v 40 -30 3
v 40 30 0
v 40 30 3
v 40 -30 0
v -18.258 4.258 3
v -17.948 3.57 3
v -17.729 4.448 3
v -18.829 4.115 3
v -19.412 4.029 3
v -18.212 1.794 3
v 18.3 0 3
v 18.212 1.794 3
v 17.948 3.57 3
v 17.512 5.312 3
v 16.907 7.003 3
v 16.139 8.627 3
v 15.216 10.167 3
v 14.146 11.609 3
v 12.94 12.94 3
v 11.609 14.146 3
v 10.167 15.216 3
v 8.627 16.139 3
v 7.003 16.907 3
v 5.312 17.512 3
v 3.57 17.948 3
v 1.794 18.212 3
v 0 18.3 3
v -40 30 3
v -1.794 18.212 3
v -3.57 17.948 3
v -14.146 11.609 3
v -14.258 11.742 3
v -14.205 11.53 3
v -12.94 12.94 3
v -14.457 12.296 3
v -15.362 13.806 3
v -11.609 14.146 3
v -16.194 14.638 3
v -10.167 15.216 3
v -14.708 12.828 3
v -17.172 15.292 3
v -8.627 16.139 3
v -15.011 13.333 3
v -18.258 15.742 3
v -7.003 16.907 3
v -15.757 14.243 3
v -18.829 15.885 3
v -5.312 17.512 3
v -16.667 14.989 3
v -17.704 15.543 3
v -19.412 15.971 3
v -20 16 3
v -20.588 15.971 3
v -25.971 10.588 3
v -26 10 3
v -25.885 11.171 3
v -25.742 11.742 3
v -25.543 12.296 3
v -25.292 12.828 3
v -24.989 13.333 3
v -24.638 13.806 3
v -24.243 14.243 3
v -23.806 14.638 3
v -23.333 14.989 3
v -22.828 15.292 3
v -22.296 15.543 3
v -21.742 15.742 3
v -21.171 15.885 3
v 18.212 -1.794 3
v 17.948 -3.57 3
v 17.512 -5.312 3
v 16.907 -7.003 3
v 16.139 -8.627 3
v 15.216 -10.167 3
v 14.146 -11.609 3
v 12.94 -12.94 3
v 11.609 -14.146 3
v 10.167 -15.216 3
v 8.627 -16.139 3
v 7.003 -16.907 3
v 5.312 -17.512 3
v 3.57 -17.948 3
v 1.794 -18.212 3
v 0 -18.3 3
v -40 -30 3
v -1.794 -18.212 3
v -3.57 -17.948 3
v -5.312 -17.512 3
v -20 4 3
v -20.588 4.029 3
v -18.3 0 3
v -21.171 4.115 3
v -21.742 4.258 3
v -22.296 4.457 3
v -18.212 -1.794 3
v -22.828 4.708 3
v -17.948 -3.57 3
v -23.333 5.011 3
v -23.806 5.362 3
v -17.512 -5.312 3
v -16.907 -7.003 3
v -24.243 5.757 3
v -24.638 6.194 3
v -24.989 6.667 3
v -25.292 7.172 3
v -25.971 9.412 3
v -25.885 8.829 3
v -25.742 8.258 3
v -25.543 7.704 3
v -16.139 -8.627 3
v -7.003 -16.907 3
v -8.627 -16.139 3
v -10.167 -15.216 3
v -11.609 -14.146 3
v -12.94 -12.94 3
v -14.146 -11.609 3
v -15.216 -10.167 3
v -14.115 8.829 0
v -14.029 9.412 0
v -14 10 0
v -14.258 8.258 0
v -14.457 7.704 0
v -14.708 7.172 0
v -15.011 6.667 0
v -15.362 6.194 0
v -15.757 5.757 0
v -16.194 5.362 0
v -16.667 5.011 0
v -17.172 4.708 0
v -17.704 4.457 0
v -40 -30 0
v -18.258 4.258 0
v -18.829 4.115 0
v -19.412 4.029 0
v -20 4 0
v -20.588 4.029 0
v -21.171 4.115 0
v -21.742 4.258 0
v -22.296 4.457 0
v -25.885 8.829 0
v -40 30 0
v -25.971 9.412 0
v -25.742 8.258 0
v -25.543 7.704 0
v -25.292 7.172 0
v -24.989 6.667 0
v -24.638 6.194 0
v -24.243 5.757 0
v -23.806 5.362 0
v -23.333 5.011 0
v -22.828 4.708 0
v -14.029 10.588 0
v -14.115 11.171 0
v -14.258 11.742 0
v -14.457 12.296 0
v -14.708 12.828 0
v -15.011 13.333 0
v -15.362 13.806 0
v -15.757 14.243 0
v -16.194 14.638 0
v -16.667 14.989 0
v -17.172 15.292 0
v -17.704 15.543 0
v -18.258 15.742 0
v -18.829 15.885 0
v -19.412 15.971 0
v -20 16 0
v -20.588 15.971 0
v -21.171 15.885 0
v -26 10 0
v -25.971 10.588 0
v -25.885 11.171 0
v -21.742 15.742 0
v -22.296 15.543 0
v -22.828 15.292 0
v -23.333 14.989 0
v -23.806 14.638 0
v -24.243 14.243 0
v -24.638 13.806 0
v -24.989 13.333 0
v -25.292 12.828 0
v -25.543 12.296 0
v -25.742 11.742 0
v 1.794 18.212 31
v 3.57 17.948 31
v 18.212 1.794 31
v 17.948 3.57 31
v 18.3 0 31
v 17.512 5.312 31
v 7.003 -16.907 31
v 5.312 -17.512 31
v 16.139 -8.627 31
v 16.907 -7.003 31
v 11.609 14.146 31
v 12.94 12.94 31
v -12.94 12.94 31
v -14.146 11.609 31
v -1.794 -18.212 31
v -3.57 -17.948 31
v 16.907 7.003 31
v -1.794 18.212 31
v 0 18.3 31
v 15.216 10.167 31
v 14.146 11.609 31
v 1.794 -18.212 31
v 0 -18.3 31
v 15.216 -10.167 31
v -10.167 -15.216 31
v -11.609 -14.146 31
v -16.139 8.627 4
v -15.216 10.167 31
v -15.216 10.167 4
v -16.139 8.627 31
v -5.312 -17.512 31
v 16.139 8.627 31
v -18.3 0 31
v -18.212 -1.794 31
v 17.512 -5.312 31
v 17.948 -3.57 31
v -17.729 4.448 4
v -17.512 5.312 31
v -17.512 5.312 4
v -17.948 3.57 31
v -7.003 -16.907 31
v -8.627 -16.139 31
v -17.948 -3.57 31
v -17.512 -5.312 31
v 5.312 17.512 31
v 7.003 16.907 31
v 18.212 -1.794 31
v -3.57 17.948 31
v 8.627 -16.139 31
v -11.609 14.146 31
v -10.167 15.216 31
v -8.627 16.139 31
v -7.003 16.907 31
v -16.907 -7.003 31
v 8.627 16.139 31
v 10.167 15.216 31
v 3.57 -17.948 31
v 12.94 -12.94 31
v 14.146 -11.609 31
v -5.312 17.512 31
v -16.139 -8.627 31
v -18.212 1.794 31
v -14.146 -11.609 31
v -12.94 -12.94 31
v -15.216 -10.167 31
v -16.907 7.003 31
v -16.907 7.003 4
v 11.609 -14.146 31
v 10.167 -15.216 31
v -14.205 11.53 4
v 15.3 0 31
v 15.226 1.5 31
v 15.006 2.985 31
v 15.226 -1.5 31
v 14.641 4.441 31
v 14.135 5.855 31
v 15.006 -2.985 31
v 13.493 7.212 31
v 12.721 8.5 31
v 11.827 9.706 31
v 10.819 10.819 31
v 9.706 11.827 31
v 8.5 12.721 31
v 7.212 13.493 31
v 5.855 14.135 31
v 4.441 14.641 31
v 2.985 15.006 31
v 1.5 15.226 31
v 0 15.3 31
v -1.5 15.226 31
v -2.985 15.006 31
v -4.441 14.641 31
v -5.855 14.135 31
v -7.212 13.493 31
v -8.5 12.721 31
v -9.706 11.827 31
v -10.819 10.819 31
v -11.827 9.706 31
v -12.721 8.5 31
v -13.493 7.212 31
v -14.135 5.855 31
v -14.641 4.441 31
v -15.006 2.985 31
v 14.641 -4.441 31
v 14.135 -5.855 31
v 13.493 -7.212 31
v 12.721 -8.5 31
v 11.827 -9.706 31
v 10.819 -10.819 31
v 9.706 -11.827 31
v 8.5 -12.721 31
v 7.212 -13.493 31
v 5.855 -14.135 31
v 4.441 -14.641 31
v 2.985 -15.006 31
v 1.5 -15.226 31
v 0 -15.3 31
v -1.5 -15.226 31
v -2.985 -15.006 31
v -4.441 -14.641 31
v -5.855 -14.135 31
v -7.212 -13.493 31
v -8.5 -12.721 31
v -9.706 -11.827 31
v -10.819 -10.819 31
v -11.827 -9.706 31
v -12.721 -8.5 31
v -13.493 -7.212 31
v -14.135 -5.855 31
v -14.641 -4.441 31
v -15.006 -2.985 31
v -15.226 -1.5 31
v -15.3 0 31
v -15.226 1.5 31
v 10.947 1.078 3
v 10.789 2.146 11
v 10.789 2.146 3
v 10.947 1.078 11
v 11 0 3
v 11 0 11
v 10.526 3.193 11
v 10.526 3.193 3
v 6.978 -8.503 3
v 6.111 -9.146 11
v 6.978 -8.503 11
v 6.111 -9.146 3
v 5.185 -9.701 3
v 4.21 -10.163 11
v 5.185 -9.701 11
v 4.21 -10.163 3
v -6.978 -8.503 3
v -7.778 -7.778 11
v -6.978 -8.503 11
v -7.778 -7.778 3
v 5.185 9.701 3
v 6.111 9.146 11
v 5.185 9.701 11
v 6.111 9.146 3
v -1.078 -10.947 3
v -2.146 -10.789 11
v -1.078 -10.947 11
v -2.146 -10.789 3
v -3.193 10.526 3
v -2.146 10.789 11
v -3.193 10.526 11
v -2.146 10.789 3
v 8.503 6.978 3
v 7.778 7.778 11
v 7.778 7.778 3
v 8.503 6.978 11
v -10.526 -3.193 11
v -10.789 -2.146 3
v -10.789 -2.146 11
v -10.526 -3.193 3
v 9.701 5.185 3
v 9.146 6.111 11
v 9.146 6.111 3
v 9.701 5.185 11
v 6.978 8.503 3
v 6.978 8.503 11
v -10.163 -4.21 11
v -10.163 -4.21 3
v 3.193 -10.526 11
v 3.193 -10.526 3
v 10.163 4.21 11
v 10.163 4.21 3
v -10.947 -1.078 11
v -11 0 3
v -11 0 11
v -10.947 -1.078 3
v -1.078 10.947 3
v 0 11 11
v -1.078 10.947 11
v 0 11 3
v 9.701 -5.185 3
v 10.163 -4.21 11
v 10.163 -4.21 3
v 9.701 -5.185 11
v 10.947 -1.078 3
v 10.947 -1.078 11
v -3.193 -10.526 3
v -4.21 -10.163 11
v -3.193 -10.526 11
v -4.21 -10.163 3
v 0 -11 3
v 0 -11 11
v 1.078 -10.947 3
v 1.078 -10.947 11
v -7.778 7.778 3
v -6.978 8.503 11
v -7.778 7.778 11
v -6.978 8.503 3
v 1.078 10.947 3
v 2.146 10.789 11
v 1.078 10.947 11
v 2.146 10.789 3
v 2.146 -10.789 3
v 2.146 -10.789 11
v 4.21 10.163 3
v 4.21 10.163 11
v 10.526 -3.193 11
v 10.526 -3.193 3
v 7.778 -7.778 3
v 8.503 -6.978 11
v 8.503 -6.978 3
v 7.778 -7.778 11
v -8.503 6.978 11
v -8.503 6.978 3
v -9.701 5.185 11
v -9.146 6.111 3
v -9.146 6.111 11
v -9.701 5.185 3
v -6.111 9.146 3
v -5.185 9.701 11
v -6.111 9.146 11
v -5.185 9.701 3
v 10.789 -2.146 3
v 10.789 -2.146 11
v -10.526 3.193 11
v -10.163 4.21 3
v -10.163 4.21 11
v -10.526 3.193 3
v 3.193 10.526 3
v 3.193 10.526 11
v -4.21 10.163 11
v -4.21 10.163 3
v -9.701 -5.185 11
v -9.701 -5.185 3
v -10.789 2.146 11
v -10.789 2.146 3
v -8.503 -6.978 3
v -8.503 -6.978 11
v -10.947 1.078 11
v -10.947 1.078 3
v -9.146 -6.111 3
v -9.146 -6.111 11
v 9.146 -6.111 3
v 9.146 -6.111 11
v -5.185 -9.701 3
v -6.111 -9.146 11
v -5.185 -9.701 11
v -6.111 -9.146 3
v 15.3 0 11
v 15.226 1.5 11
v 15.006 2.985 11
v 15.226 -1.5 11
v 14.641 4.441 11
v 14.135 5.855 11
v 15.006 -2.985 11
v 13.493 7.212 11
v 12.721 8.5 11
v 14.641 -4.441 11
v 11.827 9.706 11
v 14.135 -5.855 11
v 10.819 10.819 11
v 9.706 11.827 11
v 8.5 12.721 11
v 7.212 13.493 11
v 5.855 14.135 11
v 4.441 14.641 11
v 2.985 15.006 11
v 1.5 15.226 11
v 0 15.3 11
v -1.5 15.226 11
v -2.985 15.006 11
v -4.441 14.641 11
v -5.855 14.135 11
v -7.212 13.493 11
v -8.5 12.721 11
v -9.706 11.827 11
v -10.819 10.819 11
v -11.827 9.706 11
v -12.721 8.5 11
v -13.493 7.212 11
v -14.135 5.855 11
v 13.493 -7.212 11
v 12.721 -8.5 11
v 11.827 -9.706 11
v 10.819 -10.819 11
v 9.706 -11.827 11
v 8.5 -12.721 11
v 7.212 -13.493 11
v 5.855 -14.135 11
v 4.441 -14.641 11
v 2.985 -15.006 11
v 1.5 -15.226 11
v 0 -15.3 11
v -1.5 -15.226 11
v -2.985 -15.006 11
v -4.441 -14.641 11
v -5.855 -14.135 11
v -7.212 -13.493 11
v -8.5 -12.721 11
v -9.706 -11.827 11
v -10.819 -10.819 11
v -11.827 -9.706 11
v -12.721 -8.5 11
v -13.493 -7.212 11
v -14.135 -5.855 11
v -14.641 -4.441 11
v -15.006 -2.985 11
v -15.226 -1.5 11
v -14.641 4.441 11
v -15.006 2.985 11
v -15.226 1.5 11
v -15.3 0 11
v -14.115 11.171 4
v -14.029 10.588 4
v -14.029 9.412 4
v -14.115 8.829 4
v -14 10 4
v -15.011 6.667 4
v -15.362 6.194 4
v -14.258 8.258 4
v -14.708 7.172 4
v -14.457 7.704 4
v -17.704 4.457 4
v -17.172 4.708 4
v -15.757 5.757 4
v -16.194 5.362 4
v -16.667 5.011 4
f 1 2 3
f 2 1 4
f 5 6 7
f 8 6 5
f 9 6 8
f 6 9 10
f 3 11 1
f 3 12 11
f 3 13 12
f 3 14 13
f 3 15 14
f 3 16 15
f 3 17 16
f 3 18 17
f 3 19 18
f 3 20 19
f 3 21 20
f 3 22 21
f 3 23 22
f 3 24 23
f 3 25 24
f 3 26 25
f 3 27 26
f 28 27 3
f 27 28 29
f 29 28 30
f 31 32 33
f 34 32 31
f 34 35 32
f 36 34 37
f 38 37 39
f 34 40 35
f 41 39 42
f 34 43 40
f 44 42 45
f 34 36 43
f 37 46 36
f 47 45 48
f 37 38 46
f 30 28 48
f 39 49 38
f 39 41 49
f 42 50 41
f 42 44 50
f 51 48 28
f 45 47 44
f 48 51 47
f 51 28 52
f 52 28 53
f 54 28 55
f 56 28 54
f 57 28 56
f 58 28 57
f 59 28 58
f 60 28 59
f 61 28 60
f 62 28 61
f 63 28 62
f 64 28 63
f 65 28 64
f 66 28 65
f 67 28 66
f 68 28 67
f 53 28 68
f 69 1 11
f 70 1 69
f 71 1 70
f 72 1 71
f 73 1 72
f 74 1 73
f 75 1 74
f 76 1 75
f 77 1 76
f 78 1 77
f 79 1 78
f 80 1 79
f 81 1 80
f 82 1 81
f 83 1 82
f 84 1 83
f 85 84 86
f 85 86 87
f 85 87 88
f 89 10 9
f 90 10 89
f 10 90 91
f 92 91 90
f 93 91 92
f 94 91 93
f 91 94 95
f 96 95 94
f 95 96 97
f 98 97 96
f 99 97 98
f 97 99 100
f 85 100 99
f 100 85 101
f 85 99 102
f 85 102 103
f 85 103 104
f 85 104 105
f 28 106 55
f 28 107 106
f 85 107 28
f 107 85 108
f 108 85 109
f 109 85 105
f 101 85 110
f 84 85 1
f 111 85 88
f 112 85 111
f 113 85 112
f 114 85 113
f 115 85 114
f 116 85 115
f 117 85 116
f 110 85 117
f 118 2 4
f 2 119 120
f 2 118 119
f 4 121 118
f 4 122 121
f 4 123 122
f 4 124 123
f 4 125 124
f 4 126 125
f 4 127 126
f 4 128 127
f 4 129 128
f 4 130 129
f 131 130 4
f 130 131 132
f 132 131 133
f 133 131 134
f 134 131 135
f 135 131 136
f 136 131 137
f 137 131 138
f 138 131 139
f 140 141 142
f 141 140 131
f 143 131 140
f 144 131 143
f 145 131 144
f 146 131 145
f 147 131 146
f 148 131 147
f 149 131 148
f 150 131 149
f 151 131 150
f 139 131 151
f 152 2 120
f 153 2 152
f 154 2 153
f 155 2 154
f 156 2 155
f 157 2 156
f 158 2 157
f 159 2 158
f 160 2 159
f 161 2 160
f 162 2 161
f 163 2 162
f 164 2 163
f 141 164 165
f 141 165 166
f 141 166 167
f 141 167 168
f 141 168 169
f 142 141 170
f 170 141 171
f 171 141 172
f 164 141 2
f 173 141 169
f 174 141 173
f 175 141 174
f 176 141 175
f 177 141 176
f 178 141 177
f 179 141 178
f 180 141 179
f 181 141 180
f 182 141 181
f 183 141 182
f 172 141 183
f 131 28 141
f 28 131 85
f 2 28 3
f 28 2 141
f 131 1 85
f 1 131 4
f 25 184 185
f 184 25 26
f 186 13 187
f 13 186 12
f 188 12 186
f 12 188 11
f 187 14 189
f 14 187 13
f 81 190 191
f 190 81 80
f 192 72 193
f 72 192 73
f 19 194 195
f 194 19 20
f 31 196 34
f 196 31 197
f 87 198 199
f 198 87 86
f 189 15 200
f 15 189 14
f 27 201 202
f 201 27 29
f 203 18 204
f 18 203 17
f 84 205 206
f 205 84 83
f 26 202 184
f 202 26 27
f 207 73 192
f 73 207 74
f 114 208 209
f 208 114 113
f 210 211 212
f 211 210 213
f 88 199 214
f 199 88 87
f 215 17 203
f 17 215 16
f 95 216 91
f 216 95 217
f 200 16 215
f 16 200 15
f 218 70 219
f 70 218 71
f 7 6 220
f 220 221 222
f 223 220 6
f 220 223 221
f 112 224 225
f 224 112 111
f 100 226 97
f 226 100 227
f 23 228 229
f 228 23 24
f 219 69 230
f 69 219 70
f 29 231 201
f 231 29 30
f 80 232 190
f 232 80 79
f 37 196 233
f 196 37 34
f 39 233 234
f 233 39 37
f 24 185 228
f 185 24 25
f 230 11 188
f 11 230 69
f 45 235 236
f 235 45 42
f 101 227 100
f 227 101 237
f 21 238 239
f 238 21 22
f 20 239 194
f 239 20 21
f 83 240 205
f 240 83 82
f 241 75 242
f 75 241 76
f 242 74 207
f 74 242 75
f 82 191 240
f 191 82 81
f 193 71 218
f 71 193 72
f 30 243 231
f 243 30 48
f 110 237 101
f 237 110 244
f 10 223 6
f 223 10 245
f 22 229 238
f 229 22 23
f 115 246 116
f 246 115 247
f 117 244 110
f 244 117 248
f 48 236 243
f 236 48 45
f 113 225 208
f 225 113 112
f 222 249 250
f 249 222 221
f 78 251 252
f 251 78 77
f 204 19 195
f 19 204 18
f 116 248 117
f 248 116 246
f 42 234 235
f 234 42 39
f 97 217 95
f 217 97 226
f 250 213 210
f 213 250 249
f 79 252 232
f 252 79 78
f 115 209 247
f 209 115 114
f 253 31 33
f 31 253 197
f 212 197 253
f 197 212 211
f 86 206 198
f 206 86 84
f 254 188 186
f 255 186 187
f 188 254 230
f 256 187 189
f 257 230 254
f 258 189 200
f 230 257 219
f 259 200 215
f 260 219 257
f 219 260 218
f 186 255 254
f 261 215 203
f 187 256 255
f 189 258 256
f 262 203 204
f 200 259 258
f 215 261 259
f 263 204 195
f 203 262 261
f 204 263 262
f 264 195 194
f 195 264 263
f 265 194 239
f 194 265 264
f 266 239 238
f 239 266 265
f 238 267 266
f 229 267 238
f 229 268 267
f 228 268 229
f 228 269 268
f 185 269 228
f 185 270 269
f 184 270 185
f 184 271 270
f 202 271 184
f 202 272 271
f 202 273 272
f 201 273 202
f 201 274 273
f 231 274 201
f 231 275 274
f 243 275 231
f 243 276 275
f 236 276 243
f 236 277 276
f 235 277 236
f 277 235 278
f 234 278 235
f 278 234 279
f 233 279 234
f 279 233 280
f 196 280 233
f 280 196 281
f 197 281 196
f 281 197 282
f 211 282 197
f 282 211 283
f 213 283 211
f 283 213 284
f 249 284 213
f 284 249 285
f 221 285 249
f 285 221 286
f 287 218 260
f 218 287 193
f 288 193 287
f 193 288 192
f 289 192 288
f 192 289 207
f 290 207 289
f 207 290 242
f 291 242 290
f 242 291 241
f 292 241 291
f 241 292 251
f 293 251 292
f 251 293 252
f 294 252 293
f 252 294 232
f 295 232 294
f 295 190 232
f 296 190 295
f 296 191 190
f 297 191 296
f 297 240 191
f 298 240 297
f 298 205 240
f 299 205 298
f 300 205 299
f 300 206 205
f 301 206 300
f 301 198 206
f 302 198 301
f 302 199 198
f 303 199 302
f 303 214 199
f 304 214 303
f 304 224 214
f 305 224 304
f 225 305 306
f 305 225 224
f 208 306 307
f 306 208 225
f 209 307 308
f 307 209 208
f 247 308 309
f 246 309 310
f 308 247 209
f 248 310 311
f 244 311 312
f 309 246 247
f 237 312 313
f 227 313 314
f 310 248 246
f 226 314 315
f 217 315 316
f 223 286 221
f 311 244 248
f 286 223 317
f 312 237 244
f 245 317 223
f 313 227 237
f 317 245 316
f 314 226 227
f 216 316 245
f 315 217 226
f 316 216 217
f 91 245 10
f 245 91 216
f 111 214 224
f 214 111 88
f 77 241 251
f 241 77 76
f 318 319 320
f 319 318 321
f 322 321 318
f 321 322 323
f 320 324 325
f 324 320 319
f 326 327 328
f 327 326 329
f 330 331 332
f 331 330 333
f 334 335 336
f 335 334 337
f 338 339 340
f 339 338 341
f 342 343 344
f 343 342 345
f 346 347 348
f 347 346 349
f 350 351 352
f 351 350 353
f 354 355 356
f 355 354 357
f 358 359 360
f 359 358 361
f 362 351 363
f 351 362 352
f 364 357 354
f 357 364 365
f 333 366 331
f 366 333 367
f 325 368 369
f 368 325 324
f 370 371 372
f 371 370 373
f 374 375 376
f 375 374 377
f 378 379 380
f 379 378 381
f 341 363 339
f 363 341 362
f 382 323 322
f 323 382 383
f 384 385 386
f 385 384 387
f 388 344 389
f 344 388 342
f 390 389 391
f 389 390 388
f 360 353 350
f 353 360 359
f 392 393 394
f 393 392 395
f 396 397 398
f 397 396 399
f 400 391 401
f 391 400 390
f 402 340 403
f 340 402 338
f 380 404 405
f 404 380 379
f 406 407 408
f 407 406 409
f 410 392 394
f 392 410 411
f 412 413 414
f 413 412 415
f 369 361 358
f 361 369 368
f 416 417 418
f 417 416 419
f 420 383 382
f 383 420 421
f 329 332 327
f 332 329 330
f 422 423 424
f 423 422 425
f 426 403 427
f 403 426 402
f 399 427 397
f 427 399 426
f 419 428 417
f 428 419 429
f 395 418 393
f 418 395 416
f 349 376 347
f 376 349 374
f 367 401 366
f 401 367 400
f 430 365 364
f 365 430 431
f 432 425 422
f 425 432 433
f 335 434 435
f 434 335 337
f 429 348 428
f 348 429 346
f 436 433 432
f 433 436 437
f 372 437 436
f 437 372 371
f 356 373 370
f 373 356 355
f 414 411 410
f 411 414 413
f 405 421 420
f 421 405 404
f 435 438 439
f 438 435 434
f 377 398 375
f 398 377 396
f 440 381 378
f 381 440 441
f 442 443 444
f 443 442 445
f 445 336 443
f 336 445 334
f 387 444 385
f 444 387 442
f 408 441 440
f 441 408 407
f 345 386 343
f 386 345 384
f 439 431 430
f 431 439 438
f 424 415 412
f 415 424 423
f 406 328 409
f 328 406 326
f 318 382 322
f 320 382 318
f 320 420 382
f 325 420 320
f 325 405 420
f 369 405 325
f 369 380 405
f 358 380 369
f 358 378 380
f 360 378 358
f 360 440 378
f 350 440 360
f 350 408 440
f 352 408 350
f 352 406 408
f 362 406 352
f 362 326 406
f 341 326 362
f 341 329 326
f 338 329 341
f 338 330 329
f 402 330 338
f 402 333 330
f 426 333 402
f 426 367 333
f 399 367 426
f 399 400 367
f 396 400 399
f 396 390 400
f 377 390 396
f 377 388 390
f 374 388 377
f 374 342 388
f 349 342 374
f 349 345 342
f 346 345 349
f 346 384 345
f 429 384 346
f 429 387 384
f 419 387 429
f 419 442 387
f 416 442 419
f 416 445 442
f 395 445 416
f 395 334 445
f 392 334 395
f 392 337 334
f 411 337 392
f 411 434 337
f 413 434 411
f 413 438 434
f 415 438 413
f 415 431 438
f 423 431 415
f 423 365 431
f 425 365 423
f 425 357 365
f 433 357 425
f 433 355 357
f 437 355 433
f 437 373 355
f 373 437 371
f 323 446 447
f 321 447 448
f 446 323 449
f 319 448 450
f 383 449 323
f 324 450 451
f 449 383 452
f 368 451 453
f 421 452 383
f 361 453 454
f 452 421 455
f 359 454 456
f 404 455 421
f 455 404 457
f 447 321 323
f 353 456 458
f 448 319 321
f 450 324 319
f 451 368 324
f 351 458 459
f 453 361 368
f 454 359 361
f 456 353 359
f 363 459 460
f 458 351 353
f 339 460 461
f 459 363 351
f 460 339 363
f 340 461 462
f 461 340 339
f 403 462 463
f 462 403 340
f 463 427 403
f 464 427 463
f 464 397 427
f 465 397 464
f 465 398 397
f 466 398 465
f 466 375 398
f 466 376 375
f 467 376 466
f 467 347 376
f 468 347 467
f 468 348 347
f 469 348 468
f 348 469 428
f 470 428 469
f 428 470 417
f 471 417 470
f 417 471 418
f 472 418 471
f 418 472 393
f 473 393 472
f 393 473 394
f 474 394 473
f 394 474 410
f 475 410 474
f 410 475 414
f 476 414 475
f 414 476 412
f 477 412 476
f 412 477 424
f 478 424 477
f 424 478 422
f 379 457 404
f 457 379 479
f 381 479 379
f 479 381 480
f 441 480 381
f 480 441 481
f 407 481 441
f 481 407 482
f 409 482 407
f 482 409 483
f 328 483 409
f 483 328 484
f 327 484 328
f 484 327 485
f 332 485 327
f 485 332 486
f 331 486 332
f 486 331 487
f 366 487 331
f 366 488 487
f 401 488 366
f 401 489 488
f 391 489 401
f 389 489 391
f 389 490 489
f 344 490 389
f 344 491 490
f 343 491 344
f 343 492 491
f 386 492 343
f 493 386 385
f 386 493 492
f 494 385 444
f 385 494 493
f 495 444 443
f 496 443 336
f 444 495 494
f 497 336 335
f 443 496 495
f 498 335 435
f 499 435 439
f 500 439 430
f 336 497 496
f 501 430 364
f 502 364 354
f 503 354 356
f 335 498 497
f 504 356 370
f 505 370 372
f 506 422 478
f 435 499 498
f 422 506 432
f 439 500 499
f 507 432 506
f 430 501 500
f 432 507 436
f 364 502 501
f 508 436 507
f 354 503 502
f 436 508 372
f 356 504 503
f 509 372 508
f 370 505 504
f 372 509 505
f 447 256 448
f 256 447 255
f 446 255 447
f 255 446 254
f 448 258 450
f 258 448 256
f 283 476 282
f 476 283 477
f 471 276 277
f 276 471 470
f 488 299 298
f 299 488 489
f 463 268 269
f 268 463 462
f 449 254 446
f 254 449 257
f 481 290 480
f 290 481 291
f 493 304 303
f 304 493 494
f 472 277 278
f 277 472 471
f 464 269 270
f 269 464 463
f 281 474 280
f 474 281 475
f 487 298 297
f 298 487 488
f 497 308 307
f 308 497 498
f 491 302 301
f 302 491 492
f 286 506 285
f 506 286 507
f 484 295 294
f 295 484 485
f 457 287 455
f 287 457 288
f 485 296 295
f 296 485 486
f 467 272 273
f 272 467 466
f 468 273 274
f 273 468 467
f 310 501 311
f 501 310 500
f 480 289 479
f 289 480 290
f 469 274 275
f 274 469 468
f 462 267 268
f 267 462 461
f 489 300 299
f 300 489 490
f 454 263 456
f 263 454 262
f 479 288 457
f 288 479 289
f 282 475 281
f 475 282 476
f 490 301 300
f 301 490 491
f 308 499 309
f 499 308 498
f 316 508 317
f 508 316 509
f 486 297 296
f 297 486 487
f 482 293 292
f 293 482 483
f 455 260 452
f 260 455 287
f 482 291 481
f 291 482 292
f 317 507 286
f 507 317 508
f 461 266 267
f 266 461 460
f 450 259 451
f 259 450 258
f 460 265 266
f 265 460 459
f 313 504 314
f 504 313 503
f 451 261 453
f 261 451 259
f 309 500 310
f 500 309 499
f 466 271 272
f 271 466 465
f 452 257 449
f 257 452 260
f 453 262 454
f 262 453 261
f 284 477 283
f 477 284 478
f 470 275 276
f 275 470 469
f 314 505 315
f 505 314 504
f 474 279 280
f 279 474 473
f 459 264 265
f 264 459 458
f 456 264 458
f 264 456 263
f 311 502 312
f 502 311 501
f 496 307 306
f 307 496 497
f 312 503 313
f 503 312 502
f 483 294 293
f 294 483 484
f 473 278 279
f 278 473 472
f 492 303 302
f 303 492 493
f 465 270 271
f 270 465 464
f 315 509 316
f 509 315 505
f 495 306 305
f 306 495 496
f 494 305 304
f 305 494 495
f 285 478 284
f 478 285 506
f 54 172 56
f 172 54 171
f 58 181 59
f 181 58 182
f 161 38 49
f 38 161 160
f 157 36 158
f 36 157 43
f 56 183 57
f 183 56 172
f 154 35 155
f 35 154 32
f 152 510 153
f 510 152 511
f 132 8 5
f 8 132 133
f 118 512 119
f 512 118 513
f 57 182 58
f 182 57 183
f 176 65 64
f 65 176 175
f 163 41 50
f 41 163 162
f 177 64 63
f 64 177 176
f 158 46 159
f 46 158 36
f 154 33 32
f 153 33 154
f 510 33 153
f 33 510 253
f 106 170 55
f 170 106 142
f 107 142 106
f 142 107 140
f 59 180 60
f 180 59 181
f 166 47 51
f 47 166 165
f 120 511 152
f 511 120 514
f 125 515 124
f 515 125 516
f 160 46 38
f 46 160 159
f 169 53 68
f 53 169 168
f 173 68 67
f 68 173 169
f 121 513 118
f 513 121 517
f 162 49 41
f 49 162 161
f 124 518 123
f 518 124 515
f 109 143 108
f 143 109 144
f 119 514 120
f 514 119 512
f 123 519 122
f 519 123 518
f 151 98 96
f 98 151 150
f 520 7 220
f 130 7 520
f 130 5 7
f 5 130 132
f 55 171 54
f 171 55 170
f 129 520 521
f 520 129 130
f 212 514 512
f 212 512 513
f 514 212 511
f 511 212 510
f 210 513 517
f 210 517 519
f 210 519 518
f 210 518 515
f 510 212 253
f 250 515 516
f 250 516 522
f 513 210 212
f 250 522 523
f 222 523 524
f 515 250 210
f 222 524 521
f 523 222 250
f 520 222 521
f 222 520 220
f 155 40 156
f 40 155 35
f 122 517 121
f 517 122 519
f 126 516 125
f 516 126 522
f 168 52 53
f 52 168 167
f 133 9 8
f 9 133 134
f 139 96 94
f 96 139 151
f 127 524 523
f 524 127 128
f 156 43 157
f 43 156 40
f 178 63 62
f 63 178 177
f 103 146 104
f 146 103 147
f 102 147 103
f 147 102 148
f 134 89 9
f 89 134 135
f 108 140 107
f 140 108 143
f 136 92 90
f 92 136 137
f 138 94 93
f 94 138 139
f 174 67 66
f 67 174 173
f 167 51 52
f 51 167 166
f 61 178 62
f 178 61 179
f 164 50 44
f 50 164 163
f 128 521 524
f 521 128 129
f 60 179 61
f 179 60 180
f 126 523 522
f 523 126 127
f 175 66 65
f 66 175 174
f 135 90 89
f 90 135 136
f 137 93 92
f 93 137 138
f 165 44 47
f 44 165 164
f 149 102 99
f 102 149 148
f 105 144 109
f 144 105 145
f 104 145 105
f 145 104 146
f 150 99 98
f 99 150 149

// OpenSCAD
// Adapter: phone camera over microscope eyepiece (30 mm OD), printed phone-side down.
// Units: mm. Rests on XY plane at z=0, centred on origin in X/Y.

// --- Dimensions (measured with calipers) ---
plate_x   = 80;   // plate length along X
plate_y   = 60;   // plate width along Y
plate_z   = 3;    // plate thickness (z = 0..3)

cam_hole_d  = 12; // camera hole diameter
cam_hole_x  = -20;// camera hole centre X
cam_hole_y  = 10; // camera hole centre Y

sleeve_od   = 36.6; // sleeve outer diameter
sleeve_z0   = 3;    // sleeve base (top of plate)
sleeve_z1   = 11;   // bore step (stop)
sleeve_ztop = 31;   // sleeve open top
bore_d_low  = 22;   // bore diameter z=3..11 (sets eyepiece distance)
bore_d_high = 30.6; // bore diameter z=11..top (slides over 30 mm eyepiece)

screw_hole_d = 2.5; // radial M3 centring-screw hole diameter
screw_z      = 21;  // screw hole height
screw_count  = 3;   // radial holes, 120 deg apart, first at +X

// --- Print orientation: plate on bed, sleeve up (+Z) ---
$fn = 64;

module plate() {
    // 80 x 60 x 3 plate centred on origin, z = 0..3
    translate([-plate_x/2, -plate_y/2, 0])
        cube([plate_x, plate_y, plate_z]);
}

module camera_hole() {
    // 12 mm through-hole at (-20, 10), cut 0.5 mm past top/bottom
    translate([cam_hole_x, cam_hole_y, 0])
        cylinder(h = plate_z + 1, d = cam_hole_d, $fn = $fn);
}

module sleeve() {
    // Outer sleeve: 36.6 mm OD, z = 3..31
    translate([0, 0, sleeve_z0])
        cylinder(h = sleeve_ztop - sleeve_z0, d = sleeve_od, $fn = $fn);
}

module sleeve_bores() {
    // Lower bore 22 mm, z = 3..11 (stop)
    translate([0, 0, sleeve_z0])
        cylinder(h = sleeve_z1 - sleeve_z0, d = bore_d_low, $fn = $fn);
    // Upper bore 30.6 mm, z = 11..31 (open top)
    translate([0, 0, sleeve_z1])
        cylinder(h = sleeve_ztop - sleeve_z1, d = bore_d_high, $fn = $fn);
}

module screw_holes() {
    // 3 radial 2.5 mm holes through sleeve wall at z = 21, 120 deg apart, first at +X
    for (i = [0, 1, 2]) {
        angle = i * 120;
        translate([0, 0, screw_z])
            rotate([0, 0, angle])
                cylinder(h = 2, d = screw_hole_d, $fn = $fn);
    }
}

// --- Assemble ---
union() {
    difference() {
        union() {
            plate();
            sleeve();
        }
        camera_hole();
        sleeve_bores();
        screw_holes();
    }
}
